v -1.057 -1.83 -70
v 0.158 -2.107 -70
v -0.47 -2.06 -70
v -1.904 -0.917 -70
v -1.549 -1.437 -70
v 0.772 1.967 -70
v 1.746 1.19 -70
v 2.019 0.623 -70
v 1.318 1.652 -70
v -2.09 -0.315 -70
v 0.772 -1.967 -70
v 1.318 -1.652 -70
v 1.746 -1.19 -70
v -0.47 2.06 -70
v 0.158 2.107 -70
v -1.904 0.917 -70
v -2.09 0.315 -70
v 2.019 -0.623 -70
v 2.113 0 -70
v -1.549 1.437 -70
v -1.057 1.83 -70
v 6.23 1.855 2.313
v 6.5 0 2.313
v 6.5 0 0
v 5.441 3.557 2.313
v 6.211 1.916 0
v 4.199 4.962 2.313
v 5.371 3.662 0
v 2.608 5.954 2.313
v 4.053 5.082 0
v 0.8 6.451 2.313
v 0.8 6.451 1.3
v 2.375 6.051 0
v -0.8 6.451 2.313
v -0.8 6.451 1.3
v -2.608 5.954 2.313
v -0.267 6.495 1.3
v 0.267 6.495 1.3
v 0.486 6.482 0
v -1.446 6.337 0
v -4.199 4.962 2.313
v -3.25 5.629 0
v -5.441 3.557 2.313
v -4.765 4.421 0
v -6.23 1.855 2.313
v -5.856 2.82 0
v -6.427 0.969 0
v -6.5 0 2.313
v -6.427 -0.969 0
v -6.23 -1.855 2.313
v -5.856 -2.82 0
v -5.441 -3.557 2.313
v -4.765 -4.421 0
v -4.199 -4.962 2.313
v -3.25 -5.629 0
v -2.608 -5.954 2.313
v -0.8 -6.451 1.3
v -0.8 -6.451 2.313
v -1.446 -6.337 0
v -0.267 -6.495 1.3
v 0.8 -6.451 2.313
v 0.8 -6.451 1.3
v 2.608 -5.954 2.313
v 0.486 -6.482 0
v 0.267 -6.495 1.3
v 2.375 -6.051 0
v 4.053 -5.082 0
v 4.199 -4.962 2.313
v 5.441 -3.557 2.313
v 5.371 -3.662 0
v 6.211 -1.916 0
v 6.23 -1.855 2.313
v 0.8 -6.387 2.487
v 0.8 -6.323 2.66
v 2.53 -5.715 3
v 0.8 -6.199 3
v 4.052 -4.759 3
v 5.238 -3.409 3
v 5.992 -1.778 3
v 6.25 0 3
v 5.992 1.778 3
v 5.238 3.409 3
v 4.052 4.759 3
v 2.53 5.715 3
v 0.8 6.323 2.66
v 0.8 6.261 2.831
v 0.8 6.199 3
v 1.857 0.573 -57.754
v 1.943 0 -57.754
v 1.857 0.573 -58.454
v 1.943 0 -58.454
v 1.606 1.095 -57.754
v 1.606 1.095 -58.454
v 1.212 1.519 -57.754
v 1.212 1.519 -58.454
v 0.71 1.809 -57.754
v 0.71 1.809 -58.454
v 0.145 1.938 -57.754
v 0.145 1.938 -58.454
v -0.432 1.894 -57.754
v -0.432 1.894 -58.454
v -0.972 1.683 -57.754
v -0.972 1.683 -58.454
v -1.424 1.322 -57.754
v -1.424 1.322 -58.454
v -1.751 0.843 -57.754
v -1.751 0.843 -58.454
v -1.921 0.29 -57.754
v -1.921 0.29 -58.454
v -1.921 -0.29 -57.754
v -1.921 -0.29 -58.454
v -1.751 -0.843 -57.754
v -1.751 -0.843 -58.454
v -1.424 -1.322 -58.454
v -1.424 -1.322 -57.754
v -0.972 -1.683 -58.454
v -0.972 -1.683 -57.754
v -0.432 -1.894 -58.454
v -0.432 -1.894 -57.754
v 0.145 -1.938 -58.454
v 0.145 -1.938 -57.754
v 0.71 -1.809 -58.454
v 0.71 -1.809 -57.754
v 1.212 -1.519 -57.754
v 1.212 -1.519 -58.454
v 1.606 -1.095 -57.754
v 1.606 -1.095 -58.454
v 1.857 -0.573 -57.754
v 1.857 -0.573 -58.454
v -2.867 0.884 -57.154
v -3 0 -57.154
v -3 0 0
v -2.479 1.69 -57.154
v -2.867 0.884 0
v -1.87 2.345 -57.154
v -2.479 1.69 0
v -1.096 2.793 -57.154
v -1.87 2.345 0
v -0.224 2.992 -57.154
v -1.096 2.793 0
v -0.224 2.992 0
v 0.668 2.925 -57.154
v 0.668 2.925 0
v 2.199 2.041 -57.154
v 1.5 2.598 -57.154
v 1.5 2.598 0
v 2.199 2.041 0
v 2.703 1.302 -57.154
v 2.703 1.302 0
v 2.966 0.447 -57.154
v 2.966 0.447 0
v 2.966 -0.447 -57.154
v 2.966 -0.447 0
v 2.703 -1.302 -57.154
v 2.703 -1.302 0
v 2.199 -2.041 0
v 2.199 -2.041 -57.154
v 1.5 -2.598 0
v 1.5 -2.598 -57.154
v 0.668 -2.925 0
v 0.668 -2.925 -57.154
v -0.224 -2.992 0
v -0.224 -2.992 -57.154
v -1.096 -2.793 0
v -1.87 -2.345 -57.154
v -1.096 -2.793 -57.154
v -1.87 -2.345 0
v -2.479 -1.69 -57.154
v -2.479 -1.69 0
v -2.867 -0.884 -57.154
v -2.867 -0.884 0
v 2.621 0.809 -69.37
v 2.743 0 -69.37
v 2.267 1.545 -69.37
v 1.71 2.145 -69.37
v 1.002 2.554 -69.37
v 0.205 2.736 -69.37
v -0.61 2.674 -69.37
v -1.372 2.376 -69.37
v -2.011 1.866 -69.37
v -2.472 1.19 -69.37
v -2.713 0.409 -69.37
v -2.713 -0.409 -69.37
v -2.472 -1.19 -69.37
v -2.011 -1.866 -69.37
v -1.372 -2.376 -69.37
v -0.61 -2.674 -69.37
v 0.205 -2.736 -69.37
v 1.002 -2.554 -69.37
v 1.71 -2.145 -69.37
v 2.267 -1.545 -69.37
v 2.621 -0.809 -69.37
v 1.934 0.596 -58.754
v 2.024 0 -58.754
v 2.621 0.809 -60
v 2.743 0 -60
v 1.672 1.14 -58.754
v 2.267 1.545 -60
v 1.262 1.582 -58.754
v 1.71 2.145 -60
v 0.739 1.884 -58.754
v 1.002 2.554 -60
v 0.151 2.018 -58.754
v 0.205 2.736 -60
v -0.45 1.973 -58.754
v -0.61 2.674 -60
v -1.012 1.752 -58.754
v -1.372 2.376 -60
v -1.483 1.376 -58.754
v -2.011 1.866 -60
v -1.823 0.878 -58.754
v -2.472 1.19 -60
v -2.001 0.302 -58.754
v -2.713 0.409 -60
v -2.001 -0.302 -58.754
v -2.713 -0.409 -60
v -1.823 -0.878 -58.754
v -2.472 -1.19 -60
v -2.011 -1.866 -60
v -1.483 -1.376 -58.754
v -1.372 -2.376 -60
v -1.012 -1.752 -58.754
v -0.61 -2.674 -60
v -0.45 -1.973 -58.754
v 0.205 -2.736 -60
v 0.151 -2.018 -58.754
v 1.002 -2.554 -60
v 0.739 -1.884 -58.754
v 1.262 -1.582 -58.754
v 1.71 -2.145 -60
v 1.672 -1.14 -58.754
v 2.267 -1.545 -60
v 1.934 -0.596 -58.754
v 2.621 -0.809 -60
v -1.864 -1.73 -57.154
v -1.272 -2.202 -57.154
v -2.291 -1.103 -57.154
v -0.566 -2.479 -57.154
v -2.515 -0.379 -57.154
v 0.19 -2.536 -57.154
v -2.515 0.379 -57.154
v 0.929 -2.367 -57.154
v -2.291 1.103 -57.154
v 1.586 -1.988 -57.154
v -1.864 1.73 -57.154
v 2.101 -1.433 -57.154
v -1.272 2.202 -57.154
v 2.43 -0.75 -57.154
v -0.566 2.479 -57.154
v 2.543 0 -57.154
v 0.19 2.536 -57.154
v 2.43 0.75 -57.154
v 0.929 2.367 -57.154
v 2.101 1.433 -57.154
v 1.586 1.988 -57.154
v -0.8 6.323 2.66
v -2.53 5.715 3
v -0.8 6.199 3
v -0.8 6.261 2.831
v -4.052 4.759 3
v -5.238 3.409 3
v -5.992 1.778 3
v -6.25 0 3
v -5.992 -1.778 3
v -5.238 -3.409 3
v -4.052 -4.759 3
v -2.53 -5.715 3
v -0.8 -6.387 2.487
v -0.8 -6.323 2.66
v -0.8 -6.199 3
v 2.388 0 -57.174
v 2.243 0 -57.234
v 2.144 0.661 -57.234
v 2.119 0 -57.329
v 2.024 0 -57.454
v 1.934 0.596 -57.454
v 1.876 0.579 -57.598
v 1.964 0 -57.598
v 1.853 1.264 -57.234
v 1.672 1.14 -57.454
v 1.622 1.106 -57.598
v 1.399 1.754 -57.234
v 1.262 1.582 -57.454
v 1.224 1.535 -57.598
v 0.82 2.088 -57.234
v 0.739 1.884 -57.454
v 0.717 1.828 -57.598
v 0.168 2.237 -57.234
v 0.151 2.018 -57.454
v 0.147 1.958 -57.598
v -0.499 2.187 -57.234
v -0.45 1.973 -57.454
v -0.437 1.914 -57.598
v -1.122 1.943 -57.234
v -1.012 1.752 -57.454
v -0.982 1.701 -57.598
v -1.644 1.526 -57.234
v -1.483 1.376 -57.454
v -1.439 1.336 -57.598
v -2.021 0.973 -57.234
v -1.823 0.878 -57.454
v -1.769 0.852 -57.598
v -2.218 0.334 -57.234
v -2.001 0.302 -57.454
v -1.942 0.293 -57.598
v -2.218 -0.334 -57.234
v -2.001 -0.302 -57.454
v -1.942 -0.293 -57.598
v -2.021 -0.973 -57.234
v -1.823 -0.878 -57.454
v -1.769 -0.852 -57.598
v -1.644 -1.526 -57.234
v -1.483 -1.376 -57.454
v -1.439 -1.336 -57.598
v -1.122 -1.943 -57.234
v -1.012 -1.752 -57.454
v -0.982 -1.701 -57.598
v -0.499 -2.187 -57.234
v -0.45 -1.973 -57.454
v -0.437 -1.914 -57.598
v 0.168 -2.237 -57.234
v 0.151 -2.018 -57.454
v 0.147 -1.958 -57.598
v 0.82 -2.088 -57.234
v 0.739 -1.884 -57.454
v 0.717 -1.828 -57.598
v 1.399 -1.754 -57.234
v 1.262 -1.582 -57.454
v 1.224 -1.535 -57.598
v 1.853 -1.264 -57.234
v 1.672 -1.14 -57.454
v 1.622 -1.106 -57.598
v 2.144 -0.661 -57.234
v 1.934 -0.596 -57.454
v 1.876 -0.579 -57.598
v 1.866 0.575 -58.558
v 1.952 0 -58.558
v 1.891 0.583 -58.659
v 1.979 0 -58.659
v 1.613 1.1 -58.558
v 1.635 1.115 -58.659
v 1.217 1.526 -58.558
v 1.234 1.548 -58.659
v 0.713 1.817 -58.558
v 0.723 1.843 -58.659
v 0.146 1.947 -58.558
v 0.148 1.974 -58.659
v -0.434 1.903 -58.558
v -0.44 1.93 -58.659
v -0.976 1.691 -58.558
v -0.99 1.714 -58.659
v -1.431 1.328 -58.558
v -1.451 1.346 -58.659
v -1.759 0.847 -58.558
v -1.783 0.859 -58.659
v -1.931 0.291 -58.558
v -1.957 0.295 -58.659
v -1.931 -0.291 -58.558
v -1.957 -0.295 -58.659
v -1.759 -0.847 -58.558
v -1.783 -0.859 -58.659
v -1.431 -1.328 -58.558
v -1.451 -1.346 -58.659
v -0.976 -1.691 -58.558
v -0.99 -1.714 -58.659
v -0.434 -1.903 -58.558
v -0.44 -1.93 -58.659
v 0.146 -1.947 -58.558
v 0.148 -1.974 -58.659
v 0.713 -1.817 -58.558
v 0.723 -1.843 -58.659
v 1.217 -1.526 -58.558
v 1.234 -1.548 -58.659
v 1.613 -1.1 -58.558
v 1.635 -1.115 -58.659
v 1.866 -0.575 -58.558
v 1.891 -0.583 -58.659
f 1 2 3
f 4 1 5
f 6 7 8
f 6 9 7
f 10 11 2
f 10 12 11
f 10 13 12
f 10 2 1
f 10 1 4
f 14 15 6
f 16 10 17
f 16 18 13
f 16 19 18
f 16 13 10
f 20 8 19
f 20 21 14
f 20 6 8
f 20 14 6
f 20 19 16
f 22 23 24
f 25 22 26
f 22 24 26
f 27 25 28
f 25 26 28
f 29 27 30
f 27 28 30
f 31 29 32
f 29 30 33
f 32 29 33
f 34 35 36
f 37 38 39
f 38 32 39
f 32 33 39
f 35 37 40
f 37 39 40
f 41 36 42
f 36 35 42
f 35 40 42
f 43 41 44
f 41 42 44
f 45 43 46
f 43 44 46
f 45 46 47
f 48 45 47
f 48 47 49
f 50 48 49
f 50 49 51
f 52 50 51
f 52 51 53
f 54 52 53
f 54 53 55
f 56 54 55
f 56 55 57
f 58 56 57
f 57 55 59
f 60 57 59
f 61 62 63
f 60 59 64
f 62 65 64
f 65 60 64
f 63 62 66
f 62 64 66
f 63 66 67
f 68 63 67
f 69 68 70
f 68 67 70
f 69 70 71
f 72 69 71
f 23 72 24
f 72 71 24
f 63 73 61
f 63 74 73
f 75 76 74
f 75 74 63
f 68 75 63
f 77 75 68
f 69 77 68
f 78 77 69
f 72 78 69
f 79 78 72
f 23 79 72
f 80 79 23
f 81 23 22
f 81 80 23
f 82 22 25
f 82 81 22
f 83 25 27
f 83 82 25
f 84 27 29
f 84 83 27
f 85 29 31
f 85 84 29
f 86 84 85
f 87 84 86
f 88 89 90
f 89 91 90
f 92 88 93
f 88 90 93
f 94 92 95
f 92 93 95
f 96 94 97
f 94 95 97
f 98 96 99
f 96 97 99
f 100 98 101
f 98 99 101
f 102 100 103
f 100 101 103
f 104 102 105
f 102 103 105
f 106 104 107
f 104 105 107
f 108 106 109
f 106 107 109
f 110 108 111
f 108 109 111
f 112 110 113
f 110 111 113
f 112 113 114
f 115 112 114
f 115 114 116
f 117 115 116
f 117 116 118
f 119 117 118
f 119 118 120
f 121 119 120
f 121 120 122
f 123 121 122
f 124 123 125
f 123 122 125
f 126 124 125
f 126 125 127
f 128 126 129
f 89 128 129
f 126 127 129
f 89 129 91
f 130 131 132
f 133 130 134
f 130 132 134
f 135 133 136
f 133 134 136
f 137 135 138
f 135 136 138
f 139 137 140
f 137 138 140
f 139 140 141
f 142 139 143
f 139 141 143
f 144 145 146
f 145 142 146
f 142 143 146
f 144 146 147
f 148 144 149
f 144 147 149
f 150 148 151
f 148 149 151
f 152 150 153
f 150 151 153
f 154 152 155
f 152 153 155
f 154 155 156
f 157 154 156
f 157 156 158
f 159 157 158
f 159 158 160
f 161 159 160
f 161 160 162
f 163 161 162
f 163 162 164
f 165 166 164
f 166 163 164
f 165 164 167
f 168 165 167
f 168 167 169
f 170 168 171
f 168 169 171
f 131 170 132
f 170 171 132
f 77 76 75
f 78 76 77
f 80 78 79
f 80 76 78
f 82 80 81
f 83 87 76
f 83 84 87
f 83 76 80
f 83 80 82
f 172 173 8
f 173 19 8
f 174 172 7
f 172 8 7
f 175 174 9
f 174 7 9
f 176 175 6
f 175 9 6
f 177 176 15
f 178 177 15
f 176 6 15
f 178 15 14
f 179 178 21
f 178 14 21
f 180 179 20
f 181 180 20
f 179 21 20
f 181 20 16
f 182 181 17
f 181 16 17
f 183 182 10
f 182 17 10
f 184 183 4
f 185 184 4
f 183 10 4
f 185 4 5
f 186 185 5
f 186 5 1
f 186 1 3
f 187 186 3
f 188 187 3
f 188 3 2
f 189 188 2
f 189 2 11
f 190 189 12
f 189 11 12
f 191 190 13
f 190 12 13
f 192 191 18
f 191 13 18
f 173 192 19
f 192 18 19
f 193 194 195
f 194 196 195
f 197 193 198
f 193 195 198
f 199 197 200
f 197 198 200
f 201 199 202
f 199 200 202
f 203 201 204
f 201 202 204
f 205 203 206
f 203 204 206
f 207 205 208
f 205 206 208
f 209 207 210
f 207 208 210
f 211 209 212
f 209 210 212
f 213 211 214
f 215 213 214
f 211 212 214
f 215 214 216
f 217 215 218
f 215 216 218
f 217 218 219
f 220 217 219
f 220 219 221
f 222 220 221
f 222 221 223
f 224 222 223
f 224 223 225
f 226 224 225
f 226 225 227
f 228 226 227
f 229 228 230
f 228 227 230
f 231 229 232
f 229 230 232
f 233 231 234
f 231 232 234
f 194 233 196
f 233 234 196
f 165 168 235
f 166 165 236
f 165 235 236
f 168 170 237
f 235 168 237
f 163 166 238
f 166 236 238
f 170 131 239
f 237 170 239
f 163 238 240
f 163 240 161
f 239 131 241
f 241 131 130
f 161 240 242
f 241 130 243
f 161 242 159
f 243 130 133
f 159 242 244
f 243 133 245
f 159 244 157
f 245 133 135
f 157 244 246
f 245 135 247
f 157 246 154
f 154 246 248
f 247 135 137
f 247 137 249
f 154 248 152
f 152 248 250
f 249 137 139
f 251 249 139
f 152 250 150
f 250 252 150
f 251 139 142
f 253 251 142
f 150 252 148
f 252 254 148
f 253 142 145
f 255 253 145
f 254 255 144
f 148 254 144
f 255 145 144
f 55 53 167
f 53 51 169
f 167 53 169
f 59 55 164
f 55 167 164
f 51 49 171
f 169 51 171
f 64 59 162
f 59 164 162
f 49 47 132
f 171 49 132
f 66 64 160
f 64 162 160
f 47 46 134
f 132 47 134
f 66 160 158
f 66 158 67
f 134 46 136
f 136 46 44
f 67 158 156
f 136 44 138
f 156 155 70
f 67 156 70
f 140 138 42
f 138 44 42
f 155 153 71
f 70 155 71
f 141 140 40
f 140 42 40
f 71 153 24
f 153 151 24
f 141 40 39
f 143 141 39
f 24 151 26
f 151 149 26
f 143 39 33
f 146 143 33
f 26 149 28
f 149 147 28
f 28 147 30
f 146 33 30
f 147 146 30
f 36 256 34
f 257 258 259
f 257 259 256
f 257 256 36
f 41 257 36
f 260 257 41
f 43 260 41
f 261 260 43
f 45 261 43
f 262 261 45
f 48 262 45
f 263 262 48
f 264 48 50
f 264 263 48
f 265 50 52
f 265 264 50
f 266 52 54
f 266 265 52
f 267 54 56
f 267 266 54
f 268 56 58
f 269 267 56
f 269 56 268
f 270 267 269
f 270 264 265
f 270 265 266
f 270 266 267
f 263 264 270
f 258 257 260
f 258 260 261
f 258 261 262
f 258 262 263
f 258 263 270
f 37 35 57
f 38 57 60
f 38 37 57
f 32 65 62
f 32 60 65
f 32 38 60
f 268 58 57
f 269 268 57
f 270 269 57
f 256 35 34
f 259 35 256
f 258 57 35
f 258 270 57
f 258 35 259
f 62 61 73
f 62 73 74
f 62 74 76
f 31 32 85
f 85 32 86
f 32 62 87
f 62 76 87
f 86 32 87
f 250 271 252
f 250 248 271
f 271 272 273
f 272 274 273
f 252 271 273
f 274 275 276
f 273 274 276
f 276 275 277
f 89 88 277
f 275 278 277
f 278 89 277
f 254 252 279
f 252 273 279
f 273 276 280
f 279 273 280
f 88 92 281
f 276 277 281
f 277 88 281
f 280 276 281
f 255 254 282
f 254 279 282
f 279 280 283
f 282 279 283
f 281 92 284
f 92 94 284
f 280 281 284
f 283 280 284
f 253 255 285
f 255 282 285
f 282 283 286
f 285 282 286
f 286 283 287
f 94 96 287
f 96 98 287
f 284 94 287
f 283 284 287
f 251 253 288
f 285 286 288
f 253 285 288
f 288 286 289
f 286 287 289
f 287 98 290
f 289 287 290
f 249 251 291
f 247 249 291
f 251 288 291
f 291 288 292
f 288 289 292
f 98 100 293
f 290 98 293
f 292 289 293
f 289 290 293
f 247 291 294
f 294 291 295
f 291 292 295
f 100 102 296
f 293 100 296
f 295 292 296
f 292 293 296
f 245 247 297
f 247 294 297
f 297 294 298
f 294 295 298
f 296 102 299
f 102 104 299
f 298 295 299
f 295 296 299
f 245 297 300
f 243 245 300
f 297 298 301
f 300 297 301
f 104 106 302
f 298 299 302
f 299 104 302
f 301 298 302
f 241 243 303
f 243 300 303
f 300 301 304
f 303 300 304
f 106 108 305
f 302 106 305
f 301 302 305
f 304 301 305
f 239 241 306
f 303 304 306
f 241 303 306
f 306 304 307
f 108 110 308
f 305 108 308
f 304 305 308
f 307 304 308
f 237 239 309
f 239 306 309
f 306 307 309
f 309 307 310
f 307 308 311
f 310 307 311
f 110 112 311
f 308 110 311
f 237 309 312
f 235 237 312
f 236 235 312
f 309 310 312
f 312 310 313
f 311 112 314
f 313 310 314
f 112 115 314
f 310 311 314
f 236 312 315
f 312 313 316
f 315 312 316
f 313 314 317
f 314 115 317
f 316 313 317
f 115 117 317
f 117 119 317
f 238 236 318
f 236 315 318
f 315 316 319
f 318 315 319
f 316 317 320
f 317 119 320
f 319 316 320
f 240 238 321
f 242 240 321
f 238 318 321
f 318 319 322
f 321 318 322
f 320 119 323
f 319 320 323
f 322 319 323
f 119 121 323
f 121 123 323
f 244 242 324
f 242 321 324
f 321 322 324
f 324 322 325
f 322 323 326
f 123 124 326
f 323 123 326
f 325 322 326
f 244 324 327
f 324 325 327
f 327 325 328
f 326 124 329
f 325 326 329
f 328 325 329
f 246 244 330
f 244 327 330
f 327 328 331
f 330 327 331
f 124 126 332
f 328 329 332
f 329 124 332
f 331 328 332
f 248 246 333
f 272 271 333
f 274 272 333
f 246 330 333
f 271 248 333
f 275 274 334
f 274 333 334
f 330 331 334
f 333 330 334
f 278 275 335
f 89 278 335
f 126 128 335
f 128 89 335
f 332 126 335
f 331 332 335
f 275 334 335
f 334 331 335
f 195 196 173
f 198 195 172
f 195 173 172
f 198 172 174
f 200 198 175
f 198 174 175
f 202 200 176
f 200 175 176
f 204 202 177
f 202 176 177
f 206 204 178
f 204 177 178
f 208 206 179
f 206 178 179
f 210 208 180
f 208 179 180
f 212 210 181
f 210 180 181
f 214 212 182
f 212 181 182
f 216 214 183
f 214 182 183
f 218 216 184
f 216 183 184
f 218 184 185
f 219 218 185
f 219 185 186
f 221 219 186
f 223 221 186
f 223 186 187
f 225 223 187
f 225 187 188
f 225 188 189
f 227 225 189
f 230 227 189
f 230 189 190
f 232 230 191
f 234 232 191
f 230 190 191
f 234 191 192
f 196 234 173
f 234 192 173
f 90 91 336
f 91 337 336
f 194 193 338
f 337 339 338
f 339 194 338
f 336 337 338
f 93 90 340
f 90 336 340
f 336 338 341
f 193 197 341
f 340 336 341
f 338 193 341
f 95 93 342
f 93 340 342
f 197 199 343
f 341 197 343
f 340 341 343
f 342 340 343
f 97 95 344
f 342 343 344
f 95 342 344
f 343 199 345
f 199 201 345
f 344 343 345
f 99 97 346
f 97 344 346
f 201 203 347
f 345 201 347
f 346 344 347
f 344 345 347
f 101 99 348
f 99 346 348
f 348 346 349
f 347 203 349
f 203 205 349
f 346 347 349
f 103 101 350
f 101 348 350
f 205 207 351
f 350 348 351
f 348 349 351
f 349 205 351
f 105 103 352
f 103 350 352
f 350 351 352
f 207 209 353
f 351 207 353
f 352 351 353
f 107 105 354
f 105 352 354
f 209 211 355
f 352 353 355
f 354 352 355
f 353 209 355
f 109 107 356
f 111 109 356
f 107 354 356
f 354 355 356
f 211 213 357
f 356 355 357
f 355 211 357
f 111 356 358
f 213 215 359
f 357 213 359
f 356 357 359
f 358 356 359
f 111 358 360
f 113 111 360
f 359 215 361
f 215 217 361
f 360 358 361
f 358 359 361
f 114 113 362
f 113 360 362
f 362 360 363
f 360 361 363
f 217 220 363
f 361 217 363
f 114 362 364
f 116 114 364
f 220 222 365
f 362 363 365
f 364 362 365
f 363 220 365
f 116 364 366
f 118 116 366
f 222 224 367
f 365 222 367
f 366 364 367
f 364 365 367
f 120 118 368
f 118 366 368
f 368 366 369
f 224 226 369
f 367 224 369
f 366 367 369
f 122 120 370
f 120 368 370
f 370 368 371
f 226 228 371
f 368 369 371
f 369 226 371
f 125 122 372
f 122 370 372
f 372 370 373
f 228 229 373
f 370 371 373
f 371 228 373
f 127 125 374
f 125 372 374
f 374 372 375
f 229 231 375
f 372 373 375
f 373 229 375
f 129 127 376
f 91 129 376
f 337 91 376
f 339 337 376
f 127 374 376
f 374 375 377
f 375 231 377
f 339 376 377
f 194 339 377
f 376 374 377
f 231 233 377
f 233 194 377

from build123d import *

# Parameters (mm, degrees)
CROQUIS2_R              = 6.5
SALIENTE_EXTRUIR1_DEPTH = 3
CROQUIS3_R              = 3
SALIENTE_EXTRUIR2_DEPTH = 70
CROQUIS4_OUTSIDE_W      = 32.968
CROQUIS4_OUTSIDE_H      = 32.968
CROQUIS4_OUTSIDE_R      = 6.25
CORTAR_EXTRUIR1_DEPTH   = 4
CORTAR_EXTRUIR1_DRAFT   = -20
CROQUIS6_W              = 1.6
CROQUIS6_H              = 14.093492938
CORTAR_EXTRUIR2_DEPTH   = 1.7


# Read off the part's stored shape, not the designer's step: #12-24 Machine Threads Stud1
with BuildPart() as part:
    # Croquis2 → Saliente-Extruir1 (new body)
    with BuildSketch(Plane.XY):
        Circle(CROQUIS2_R)
    extrude(amount=SALIENTE_EXTRUIR1_DEPTH)

    # Croquis3 → Saliente-Extruir2 (add)
    with BuildSketch(Plane(origin=(0, 0, 0), x_dir=(-1, 0, 0), z_dir=(0, 0, -1))):
        Circle(CROQUIS3_R)
    extrude(amount=SALIENTE_EXTRUIR2_DEPTH)


with BuildPart() as cortar_extruir1_tool:
    # Croquis4 outside → Cortar-Extruir1 (with draft: the straight prism first)
    with BuildSketch(Plane.XY.offset(3)):
        Rectangle(CROQUIS4_OUTSIDE_W, CROQUIS4_OUTSIDE_H)
        Circle(CROQUIS4_OUTSIDE_R, mode=Mode.SUBTRACT)
    extrude(amount=-CORTAR_EXTRUIR1_DEPTH)
    # Cortar-Extruir1: the draft: its side faces are tilted about the plane it starts from
    cortar_extruir1_sides = [cortar_extruir1_tool.faces().sort_by_distance(p)[0] for p in [
        (0, -16.484, 1),
        (16.484, 0, 1),
        (0, 16.484, 1),
        (-16.484, 0, 1),
        (-6.25, 0, 1),
    ]]
    draft(cortar_extruir1_sides, Plane.XY.offset(3), CORTAR_EXTRUIR1_DRAFT)


with BuildPart() as part_1:
    add(part.part)

    # Cortar-Extruir1: cut by cortar_extruir1_tool
    add(cortar_extruir1_tool.part, mode=Mode.SUBTRACT)

    # Croquis6 → Cortar-Extruir2 (cut)
    with BuildSketch(Plane.XY.offset(3)):
        Rectangle(CROQUIS6_W, CROQUIS6_H)
    extrude(amount=-CORTAR_EXTRUIR2_DEPTH, mode=Mode.SUBTRACT)

    # #12-24 Machine Threads Stud1 outline → #12-24 Machine Threads Stud1 (revolve, cut)
    with BuildSketch(Plane.XZ):
        with BuildLine():
            Line((2.11328, -70), (3, -70))
            Line((3, -70), (3, -57.153588301))
            Line((3, -57.153588301), (2.543199892, -57.153588301))
            ThreePointArc((2.543199892, -57.153588301), (2.118935595, -57.329324327), (1.943199568, -57.753588625))
            Line((1.943199568, -57.753588625), (1.943199568, -58.453589003))
            ThreePointArc((1.943199568, -58.453589003), (1.963644083, -58.608880514), (2.023584369, -58.753589165))
            Line((2.023584369, -58.753589165), (2.7432, -60))
            Line((2.7432, -60), (2.7432, -69.37008))
            Line((2.7432, -69.37008), (2.11328, -70))
        make_face()
    revolve(axis=Axis((0, 0, 0), (0, 0, 1)), mode=Mode.SUBTRACT)


solid = part_1.part
